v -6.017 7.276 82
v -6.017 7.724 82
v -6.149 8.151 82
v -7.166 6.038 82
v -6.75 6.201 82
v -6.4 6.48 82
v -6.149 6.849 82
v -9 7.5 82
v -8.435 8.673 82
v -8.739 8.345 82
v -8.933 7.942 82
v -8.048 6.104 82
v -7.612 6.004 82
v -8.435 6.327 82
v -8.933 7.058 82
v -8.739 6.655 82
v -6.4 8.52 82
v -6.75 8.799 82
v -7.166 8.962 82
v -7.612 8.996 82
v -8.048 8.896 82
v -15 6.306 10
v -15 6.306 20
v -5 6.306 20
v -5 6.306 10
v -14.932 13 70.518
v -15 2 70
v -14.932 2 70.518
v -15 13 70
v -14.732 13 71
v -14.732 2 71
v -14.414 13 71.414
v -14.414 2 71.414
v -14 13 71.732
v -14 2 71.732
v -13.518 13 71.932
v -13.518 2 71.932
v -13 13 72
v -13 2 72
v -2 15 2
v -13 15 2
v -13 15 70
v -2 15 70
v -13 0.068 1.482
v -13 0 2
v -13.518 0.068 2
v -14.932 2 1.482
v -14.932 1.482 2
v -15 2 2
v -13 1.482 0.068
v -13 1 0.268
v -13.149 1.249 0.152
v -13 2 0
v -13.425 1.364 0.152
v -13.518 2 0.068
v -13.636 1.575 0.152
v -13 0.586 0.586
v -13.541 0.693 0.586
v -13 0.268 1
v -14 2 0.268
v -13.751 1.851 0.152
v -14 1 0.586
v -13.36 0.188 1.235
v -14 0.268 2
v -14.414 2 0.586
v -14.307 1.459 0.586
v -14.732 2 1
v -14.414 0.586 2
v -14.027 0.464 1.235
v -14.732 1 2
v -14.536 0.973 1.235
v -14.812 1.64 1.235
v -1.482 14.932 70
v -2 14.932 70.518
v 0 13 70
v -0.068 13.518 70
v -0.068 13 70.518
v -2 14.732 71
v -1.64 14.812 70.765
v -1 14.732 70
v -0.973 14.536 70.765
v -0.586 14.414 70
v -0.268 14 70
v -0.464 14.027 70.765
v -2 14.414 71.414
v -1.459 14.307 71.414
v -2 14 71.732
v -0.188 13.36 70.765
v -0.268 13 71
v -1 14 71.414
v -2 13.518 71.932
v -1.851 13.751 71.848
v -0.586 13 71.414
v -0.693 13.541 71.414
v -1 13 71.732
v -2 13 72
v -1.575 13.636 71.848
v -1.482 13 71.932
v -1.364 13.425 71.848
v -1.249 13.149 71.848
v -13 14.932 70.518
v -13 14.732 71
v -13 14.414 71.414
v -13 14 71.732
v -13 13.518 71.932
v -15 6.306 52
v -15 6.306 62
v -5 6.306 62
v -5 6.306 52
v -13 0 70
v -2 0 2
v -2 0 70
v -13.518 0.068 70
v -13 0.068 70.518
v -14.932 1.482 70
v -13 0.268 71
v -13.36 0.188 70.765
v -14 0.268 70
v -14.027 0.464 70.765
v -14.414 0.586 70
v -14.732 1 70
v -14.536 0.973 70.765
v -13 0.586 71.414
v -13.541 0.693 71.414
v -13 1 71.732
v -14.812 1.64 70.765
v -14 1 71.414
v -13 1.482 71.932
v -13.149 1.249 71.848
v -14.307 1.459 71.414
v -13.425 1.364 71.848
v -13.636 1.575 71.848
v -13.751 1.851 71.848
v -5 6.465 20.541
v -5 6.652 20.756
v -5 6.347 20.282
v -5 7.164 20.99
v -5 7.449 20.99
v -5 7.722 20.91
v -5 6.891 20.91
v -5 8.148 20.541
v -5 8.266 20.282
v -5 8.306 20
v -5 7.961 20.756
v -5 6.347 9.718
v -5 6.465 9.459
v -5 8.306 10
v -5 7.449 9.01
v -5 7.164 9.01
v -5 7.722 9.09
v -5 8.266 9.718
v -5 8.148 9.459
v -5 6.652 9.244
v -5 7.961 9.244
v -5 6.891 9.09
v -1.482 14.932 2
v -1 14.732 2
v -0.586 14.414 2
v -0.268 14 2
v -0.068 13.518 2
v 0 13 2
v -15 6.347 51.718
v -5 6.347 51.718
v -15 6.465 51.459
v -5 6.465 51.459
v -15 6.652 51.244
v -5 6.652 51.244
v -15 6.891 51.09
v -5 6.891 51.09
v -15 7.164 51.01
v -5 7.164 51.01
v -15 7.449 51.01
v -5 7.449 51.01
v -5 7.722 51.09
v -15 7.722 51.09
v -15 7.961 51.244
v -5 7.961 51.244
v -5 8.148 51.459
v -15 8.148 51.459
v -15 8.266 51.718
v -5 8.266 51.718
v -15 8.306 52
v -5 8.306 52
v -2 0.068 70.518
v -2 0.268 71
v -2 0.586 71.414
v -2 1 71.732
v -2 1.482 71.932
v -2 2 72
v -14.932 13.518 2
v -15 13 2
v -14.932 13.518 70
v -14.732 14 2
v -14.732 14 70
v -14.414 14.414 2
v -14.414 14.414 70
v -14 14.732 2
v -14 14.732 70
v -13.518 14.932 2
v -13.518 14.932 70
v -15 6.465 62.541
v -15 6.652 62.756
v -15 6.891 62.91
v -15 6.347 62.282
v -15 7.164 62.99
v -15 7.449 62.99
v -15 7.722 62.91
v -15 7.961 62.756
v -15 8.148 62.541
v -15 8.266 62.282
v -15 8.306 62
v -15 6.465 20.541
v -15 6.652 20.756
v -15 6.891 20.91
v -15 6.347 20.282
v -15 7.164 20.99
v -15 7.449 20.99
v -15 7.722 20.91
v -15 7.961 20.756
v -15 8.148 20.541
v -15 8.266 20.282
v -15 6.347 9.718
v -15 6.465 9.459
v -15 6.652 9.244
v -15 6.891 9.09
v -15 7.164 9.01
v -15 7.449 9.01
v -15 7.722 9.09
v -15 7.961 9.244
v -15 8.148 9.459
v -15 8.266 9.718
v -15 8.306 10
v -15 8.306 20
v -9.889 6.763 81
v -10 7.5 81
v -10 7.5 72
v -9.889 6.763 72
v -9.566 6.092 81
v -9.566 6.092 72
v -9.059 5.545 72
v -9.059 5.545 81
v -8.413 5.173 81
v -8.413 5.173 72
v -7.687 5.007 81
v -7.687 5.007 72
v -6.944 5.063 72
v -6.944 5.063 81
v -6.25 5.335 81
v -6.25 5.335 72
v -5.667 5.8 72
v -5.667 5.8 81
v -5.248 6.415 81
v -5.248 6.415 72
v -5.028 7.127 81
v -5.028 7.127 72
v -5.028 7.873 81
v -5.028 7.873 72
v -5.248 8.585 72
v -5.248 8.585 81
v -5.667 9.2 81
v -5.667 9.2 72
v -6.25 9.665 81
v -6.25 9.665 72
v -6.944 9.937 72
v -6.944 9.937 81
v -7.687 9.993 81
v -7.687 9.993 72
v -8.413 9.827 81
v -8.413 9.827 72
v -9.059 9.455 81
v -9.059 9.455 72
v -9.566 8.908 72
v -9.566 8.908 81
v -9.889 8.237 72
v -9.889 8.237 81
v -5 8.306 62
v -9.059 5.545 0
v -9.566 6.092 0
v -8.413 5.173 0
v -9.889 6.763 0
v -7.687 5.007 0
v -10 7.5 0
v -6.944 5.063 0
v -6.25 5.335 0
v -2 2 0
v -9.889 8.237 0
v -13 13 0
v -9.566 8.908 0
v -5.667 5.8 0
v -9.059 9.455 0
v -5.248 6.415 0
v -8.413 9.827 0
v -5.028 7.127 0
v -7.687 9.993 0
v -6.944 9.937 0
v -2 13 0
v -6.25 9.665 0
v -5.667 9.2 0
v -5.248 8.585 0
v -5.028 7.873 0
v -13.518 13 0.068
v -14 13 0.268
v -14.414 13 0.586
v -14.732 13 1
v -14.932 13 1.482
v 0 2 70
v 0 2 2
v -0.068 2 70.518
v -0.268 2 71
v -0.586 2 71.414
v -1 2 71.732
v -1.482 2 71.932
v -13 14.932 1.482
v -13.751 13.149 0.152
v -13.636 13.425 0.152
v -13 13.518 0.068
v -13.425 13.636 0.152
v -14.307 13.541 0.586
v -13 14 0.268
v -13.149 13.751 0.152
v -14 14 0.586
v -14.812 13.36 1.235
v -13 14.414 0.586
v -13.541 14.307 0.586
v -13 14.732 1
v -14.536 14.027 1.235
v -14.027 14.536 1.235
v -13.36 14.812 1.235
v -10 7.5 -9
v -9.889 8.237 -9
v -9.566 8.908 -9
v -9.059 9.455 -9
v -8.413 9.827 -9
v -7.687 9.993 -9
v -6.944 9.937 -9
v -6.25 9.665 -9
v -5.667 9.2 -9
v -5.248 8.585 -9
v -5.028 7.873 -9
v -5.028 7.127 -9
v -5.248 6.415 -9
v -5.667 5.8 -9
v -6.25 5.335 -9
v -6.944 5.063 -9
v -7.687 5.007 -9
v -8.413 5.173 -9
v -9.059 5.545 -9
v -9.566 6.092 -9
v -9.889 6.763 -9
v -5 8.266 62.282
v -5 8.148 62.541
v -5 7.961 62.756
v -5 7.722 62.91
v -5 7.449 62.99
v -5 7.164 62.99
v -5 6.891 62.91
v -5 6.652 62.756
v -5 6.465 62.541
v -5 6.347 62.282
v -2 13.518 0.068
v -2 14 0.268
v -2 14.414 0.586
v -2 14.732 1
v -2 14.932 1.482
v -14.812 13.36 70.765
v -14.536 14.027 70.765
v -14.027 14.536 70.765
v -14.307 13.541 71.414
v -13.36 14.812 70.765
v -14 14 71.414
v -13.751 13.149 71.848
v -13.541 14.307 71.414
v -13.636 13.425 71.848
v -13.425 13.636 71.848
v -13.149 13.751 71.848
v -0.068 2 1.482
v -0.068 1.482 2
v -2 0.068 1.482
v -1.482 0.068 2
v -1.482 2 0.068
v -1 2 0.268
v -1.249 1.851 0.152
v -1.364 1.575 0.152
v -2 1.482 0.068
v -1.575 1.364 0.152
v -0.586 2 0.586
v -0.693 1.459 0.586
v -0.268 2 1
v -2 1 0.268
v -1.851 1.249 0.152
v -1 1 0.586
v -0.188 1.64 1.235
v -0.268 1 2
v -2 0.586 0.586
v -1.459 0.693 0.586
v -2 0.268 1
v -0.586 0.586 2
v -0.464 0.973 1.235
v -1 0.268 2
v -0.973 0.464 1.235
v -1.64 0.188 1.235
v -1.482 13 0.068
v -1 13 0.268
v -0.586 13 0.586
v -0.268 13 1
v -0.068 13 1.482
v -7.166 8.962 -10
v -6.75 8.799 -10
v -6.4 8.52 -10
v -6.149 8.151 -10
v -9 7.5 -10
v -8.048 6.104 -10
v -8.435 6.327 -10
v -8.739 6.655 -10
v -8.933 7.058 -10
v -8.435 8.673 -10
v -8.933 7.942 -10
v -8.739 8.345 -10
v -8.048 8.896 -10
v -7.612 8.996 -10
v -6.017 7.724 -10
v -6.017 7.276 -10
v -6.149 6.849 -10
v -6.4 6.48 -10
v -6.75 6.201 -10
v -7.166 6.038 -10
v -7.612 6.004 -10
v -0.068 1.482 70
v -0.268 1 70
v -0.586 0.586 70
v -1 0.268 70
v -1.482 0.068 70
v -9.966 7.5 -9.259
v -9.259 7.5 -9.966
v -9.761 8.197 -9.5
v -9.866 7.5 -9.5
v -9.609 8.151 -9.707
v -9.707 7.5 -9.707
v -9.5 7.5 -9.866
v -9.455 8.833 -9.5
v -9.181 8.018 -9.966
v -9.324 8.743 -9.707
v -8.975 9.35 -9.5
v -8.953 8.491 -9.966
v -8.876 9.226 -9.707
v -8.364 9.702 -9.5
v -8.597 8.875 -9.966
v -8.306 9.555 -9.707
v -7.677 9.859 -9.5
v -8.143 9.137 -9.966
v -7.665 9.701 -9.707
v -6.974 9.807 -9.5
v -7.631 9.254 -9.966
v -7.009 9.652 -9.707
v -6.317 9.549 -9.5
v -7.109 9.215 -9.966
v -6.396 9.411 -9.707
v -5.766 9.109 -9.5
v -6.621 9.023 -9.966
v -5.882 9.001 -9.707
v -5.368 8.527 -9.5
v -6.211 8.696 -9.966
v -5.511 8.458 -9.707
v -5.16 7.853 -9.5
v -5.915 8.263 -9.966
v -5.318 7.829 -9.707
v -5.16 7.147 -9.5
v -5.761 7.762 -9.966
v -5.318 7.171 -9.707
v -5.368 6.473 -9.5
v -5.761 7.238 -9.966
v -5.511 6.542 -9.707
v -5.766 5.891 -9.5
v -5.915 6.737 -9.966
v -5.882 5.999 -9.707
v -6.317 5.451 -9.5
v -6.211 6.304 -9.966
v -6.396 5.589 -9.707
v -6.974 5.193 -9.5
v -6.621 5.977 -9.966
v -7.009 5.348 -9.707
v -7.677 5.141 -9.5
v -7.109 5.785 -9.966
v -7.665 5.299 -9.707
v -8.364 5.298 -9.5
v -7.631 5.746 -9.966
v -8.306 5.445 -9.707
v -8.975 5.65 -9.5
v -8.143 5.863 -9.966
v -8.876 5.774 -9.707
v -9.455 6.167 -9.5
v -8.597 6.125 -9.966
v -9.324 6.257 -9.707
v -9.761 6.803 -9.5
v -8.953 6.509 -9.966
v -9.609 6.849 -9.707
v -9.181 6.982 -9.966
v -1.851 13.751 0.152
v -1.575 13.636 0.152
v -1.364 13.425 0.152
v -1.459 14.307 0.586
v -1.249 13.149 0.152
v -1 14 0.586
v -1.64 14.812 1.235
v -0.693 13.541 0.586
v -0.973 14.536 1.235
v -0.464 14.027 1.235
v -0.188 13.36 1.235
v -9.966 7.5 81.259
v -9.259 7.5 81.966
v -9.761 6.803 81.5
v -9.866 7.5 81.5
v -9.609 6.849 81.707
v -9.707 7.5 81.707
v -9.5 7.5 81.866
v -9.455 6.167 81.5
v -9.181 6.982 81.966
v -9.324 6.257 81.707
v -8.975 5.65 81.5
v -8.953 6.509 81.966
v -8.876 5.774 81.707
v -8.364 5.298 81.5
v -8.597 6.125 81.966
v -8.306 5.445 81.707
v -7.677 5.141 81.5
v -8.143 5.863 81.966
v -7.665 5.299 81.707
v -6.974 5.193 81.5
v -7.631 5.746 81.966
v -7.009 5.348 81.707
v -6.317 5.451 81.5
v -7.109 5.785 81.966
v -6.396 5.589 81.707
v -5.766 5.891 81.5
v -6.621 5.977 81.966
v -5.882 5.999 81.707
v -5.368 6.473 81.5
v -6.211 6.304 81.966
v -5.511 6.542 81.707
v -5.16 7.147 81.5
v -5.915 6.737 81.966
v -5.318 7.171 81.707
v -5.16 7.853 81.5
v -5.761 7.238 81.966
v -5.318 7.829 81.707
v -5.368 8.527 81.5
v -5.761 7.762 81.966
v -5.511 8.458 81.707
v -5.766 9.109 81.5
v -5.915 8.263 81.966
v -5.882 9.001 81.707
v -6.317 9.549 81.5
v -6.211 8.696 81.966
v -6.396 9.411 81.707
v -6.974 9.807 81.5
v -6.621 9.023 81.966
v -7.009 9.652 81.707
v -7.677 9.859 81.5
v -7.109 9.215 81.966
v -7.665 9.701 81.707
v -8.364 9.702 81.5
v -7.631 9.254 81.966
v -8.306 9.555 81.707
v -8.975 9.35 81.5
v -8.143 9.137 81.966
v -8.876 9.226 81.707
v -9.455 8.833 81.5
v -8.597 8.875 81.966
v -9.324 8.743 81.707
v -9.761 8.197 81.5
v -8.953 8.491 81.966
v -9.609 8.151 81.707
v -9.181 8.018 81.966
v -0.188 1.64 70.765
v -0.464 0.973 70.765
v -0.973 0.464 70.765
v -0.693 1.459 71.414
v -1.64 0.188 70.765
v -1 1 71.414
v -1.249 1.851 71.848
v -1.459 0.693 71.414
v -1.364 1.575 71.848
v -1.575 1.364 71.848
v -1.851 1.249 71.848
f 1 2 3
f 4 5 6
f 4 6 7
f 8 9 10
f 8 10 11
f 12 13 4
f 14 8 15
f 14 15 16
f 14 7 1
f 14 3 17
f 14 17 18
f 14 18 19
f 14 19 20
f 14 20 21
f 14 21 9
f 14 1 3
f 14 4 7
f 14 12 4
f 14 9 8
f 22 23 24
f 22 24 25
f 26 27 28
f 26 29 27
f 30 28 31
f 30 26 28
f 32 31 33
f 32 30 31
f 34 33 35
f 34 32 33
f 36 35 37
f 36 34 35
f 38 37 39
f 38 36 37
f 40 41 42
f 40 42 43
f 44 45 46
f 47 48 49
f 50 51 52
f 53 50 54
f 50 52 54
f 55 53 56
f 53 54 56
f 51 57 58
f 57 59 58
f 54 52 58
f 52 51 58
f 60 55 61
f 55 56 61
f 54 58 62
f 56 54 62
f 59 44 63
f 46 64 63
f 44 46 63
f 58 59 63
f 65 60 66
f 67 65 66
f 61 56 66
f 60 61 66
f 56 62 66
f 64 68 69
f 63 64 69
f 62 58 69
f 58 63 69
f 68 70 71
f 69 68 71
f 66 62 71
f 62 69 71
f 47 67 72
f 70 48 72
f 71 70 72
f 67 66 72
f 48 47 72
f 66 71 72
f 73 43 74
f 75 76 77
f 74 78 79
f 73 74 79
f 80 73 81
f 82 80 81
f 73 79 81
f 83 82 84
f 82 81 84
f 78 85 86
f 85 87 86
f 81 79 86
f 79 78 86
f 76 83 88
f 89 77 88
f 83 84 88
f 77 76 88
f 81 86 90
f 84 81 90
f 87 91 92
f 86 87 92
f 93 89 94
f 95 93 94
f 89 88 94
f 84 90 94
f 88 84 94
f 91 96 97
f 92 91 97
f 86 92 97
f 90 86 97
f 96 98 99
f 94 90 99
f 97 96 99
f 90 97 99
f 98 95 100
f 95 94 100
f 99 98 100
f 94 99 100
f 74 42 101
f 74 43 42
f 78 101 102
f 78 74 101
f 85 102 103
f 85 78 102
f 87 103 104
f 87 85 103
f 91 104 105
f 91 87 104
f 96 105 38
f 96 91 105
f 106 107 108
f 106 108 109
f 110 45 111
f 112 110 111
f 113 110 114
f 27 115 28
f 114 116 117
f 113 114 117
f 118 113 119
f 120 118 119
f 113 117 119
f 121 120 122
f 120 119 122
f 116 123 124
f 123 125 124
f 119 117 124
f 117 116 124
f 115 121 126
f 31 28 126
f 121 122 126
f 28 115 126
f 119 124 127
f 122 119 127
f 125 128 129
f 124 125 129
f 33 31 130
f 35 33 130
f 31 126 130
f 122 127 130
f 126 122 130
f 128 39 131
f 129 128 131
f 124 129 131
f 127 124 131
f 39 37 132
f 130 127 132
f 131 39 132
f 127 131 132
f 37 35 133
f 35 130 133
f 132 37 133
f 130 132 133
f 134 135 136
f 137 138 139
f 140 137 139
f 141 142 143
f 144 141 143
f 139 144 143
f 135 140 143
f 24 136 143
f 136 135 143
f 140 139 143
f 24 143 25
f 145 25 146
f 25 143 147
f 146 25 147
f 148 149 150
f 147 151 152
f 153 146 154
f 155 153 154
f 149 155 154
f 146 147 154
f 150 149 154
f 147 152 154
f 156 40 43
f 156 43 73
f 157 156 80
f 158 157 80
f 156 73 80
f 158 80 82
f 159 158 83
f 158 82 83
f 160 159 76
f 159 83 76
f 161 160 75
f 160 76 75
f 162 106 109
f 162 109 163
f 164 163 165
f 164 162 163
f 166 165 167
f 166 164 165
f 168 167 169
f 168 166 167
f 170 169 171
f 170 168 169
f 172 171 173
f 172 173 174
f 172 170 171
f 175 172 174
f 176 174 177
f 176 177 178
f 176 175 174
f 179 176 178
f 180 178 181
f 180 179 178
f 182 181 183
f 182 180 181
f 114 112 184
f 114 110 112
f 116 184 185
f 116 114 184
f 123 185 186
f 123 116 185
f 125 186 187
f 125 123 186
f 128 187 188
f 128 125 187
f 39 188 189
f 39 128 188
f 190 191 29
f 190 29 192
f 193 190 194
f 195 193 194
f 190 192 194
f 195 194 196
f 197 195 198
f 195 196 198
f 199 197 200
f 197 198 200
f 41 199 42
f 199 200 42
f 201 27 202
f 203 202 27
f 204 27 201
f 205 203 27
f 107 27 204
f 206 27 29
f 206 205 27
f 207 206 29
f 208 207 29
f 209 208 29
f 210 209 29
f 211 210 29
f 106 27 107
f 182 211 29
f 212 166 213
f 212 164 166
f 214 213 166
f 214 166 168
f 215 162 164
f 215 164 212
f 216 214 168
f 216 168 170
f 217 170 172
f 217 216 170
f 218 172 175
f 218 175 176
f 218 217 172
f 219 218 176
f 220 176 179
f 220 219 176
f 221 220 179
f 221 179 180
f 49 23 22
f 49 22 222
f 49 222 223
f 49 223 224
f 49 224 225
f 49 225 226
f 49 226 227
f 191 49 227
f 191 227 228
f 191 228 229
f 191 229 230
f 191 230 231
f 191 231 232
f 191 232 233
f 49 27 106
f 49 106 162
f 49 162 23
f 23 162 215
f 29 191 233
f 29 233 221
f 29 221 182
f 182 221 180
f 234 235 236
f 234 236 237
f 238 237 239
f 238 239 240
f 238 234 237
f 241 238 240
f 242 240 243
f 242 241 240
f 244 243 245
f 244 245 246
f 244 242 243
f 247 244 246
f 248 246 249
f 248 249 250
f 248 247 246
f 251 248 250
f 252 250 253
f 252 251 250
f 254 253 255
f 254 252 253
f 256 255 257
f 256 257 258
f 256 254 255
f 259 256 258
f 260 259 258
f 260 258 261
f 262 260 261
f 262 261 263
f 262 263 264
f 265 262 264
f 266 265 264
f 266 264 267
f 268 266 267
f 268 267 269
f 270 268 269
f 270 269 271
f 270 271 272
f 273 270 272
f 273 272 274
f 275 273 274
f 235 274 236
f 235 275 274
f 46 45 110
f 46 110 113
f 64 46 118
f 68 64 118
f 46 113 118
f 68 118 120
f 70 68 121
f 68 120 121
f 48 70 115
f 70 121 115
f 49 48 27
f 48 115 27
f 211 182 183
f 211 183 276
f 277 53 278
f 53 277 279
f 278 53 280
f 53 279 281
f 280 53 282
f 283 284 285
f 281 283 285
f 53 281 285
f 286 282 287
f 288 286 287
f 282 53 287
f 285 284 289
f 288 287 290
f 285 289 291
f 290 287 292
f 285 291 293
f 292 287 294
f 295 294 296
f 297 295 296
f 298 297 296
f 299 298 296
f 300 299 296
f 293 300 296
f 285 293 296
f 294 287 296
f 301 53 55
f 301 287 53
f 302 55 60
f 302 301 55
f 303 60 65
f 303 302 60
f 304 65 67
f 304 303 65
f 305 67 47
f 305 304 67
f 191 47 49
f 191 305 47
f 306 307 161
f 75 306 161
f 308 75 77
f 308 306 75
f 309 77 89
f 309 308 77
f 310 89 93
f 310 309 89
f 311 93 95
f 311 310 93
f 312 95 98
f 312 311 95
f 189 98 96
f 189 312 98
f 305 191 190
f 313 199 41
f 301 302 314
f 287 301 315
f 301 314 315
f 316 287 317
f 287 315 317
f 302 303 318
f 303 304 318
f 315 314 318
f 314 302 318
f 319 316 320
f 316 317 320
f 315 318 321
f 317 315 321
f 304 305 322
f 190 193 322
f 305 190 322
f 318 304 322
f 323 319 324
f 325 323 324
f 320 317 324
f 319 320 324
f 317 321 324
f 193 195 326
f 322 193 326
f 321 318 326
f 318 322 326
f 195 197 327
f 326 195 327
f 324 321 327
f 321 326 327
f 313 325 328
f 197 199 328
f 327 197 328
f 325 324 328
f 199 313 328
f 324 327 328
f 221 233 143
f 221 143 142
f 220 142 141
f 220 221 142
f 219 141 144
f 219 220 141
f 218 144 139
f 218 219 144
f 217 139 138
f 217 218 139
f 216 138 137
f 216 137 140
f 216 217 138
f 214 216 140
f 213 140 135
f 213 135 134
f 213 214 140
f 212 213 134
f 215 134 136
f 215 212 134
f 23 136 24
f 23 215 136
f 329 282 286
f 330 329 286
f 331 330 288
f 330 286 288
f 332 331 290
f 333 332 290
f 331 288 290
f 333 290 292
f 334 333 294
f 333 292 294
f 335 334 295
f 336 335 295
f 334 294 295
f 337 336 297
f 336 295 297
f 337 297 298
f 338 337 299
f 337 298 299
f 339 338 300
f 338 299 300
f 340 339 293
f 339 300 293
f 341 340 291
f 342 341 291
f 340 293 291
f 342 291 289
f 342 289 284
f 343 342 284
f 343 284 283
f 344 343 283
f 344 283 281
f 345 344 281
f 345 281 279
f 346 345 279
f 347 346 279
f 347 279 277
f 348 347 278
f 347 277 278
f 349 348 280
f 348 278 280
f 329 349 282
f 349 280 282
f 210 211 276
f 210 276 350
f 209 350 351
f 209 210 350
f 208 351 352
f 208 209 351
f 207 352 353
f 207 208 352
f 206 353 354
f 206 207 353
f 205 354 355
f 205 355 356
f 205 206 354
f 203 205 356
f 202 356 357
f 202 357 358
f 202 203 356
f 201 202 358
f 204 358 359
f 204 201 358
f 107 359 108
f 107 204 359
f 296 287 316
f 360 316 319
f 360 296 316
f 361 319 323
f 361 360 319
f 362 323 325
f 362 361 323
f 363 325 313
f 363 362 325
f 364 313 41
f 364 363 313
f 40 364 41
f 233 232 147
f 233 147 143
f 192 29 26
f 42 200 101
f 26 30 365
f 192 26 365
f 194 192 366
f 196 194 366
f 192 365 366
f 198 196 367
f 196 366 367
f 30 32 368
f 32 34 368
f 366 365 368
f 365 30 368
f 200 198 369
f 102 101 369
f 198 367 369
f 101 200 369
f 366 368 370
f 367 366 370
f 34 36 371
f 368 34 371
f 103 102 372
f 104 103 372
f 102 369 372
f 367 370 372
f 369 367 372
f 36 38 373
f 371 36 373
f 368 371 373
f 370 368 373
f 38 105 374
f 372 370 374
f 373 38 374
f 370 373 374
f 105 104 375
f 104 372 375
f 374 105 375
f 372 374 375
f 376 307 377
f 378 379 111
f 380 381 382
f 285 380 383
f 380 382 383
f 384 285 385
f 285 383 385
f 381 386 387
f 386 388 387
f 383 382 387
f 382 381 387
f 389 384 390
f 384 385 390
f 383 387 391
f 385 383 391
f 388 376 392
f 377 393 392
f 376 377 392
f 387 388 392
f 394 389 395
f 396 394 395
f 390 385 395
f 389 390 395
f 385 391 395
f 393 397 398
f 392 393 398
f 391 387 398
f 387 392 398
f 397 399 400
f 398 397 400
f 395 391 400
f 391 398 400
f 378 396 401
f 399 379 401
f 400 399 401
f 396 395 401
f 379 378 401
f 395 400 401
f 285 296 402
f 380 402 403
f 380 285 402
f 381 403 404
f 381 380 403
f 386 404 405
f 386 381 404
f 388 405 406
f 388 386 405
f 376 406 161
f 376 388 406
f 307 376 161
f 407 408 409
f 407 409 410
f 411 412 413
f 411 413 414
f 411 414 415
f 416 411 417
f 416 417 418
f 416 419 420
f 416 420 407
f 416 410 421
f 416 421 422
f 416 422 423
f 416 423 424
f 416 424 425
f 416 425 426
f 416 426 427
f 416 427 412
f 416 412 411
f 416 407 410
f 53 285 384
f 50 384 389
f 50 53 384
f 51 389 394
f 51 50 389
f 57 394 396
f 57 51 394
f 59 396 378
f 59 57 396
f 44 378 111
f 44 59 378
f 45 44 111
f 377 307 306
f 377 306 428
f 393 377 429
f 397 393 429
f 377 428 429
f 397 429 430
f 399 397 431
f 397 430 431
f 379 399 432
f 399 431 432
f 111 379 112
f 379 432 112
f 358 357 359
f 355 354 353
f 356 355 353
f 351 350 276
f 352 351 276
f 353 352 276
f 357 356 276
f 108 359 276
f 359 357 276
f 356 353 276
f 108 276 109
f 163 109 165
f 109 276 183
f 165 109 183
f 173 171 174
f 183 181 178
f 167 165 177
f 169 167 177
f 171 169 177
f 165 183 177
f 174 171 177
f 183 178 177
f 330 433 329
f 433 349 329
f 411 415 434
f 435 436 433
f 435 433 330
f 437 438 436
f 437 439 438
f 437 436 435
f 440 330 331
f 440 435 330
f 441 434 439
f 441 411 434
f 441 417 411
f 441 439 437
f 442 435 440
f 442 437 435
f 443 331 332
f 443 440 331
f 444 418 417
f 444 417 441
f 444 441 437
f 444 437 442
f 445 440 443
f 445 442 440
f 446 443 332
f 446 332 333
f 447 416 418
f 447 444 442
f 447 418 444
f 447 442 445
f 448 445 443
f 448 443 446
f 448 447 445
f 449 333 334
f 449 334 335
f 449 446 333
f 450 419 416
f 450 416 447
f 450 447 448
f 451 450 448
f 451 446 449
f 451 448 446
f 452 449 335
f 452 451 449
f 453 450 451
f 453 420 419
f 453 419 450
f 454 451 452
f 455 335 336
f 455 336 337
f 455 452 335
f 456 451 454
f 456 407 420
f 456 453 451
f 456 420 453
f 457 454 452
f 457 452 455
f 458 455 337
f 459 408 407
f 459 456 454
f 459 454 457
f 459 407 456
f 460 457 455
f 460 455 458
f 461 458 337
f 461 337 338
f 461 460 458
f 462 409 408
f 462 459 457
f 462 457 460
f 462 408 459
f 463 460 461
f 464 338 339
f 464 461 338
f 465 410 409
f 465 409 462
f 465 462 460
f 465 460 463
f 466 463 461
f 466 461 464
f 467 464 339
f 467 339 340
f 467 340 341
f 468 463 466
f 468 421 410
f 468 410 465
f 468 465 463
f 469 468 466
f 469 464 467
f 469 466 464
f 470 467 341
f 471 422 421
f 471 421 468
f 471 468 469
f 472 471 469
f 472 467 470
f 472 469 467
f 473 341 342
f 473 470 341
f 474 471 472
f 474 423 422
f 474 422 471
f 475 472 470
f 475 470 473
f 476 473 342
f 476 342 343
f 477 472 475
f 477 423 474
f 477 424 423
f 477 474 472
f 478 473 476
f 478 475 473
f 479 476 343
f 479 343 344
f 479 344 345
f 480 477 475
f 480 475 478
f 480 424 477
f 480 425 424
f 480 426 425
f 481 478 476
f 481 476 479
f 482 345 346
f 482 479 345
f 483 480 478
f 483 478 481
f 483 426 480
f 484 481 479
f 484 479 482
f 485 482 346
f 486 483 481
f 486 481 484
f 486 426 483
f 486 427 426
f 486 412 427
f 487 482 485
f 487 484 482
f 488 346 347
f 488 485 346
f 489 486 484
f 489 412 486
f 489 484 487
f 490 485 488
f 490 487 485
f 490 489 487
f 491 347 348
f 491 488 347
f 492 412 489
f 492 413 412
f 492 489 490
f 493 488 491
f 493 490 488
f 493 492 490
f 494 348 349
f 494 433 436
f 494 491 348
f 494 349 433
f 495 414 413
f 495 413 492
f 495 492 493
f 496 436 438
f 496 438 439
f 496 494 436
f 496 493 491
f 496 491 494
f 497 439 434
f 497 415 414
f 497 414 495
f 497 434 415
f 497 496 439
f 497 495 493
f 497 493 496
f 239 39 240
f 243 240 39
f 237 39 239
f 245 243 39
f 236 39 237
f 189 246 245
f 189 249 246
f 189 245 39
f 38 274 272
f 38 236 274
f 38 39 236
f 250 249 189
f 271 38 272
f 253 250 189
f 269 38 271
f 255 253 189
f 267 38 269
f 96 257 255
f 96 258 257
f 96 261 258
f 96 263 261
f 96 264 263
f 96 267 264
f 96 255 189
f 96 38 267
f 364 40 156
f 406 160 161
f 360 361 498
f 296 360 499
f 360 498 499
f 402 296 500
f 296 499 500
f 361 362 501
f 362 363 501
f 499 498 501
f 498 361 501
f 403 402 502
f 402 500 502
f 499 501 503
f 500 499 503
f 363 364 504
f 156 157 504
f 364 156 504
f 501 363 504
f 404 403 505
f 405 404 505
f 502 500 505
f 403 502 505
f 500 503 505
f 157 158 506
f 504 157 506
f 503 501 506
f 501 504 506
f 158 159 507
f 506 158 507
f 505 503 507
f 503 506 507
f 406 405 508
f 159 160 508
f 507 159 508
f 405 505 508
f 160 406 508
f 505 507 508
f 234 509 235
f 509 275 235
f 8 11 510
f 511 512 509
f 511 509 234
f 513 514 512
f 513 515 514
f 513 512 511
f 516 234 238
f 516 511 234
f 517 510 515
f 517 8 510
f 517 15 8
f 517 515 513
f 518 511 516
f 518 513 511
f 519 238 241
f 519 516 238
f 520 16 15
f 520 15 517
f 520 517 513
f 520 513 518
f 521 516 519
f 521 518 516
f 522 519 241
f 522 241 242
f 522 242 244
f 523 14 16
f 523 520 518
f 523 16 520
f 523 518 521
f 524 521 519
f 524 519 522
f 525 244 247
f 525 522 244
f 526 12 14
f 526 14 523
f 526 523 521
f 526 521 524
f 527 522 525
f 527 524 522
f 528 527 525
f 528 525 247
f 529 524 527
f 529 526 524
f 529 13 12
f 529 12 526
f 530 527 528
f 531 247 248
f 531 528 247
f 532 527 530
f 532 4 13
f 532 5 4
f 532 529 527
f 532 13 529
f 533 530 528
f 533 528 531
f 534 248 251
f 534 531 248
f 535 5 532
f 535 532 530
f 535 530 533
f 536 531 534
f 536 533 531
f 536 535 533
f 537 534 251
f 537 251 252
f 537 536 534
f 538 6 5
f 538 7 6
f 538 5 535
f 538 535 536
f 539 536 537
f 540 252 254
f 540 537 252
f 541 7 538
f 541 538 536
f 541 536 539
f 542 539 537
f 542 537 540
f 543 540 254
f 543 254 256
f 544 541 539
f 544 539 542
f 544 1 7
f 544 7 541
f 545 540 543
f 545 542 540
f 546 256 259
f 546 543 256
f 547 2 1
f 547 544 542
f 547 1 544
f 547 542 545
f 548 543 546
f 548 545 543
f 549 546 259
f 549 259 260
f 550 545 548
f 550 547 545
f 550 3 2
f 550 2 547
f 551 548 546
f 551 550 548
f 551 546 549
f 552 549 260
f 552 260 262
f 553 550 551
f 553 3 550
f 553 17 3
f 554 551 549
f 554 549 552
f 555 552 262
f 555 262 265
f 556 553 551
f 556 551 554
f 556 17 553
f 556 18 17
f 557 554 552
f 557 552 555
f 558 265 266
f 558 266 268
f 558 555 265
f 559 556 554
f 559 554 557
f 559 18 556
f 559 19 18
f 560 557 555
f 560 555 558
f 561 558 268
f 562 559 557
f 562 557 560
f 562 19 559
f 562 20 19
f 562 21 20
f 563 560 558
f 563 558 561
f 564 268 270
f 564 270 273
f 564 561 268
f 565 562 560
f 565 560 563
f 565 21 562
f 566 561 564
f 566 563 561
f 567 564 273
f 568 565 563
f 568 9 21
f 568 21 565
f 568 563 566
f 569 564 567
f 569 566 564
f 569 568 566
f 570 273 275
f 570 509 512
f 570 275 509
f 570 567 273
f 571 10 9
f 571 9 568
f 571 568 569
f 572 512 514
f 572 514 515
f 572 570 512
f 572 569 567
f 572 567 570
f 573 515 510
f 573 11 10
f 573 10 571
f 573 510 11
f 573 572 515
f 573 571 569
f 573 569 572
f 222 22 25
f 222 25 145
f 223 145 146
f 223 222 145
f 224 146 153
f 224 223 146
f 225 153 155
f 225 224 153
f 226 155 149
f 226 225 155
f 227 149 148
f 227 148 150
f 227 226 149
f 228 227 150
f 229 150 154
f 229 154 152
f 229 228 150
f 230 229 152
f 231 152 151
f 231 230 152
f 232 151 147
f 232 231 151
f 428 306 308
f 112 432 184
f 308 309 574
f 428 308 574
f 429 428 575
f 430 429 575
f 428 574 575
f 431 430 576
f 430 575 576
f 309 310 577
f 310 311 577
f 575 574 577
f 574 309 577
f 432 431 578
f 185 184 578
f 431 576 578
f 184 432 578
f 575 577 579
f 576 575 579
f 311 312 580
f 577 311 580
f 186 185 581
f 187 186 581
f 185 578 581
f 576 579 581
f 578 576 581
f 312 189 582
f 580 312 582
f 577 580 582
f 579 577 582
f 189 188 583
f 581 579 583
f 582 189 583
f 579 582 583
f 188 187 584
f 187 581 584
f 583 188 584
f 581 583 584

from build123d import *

# Parameters (mm, degrees)
SKETCH1_W           = 15
SKETCH1_H           = 15
BOSS_EXTRUDE1_DEPTH = 72
SKETCH2_R           = 2.5
BOSS_EXTRUDE2_DEPTH = 10
BOSS_EXTRUDE3_START = 10
SKETCH3_R           = 2.5
BOSS_EXTRUDE3_DEPTH = 10
CUT_EXTRUDE1_DEPTH  = 10
FILLET1_R           = 2
FILLET2_R           = 2
FILLET3_R           = 2
FILLET4_R           = 2
FILLET5_R           = 2
FILLET6_R           = 2
FILLET7_R           = 1
FILLET8_R           = 1


with BuildPart() as part:
    # Sketch1 → Boss-Extrude1 (new body)
    with BuildSketch(Plane.XY):
        with Locations((-7.5, 7.5)):
            Rectangle(SKETCH1_W, SKETCH1_H)
    extrude(amount=BOSS_EXTRUDE1_DEPTH)

    # Sketch2 → Boss-Extrude2 (add)
    with BuildSketch(Plane(origin=(0, 0, 0), x_dir=(-1, 0, 0), z_dir=(0, 0, -1))):
        with Locations((7.5, 7.5)):
            Circle(SKETCH2_R)
    extrude(amount=BOSS_EXTRUDE2_DEPTH)

    # Sketch3 → Boss-Extrude3 (add)
    with BuildSketch(Plane.XY.offset(72).offset(BOSS_EXTRUDE3_START)):
        with Locations(Location((-7.5, 7.5, 0), (0, 0, 180))):
            Circle(SKETCH3_R)
    extrude(amount=-BOSS_EXTRUDE3_DEPTH)

    # Sketch5 → Cut-Extrude1 (cut)
    with BuildSketch(Plane.ZY.offset(15)):
        with BuildLine():
            Line((20, 6.306366703), (10, 6.306366703))
            ThreePointArc((10, 6.306366703), (9, 7.306366703), (10, 8.306366703))
            Line((10, 8.306366703), (20, 8.306366703))
            ThreePointArc((20, 8.306366703), (21, 7.306366703), (20, 6.306366703))
        make_face()
        with BuildLine():
            Line((52, 8.306366703), (62, 8.306366703))
            ThreePointArc((62, 8.306366703), (63, 7.306366703), (62, 6.306366703))
            Line((62, 6.306366703), (52, 6.306366703))
            ThreePointArc((52, 6.306366703), (51, 7.306366703), (52, 8.306366703))
        make_face()
    extrude(amount=-CUT_EXTRUDE1_DEPTH, mode=Mode.SUBTRACT)

    # Fillet1
    fillet1_edges = [part.edges().sort_by_distance(p)[0] for p in [
        (-15, 15, 36),
    ]]
    fillet(fillet1_edges, radius=FILLET1_R)

    # Fillet2
    fillet2_edges = [part.edges().sort_by_distance(p)[0] for p in [
        (0, 15, 36),
    ]]
    fillet(fillet2_edges, radius=FILLET2_R)

    # Fillet3
    fillet3_edges = [part.edges().sort_by_distance(p)[0] for p in [
        (0, 0, 36),
    ]]
    fillet(fillet3_edges, radius=FILLET3_R)

    # Fillet4
    fillet4_edges = [part.edges().sort_by_distance(p)[0] for p in [
        (-15, 0, 36),
    ]]
    fillet(fillet4_edges, radius=FILLET4_R)

    # Fillet5
    fillet5_edges = [part.edges().sort_by_distance(p)[0] for p in [
        (-15, 7.5, 0),
        (-14.414213562, 14.414213562, 0),
        (-7.5, 15, 0),
        (-0.585786438, 14.414213562, 0),
        (0, 7.5, 0),
        (-0.585786438, 0.585786438, 0),
        (-7.5, 0, 0),
        (-14.414213562, 0.585786438, 0),
    ]]
    fillet(fillet5_edges, radius=FILLET5_R)

    # Fillet6
    fillet6_edges = [part.edges().sort_by_distance(p)[0] for p in [
        (-15, 7.5, 72),
        (-14.414213562, 14.414213562, 72),
        (-7.5, 15, 72),
        (-0.585786438, 14.414213562, 72),
        (0, 7.5, 72),
        (-0.585786438, 0.585786438, 72),
        (-7.5, 0, 72),
        (-14.414213562, 0.585786438, 72),
    ]]
    fillet(fillet6_edges, radius=FILLET6_R)

    # Fillet7
    fillet7_edges = [part.edges().sort_by_distance(p)[0] for p in [
        (-5, 7.5, 82),
    ]]
    fillet(fillet7_edges, radius=FILLET7_R)

    # Fillet8
    fillet8_edges = [part.edges().sort_by_distance(p)[0] for p in [
        (-5, 7.5, -10),
    ]]
    fillet(fillet8_edges, radius=FILLET8_R)


solid = part.part
